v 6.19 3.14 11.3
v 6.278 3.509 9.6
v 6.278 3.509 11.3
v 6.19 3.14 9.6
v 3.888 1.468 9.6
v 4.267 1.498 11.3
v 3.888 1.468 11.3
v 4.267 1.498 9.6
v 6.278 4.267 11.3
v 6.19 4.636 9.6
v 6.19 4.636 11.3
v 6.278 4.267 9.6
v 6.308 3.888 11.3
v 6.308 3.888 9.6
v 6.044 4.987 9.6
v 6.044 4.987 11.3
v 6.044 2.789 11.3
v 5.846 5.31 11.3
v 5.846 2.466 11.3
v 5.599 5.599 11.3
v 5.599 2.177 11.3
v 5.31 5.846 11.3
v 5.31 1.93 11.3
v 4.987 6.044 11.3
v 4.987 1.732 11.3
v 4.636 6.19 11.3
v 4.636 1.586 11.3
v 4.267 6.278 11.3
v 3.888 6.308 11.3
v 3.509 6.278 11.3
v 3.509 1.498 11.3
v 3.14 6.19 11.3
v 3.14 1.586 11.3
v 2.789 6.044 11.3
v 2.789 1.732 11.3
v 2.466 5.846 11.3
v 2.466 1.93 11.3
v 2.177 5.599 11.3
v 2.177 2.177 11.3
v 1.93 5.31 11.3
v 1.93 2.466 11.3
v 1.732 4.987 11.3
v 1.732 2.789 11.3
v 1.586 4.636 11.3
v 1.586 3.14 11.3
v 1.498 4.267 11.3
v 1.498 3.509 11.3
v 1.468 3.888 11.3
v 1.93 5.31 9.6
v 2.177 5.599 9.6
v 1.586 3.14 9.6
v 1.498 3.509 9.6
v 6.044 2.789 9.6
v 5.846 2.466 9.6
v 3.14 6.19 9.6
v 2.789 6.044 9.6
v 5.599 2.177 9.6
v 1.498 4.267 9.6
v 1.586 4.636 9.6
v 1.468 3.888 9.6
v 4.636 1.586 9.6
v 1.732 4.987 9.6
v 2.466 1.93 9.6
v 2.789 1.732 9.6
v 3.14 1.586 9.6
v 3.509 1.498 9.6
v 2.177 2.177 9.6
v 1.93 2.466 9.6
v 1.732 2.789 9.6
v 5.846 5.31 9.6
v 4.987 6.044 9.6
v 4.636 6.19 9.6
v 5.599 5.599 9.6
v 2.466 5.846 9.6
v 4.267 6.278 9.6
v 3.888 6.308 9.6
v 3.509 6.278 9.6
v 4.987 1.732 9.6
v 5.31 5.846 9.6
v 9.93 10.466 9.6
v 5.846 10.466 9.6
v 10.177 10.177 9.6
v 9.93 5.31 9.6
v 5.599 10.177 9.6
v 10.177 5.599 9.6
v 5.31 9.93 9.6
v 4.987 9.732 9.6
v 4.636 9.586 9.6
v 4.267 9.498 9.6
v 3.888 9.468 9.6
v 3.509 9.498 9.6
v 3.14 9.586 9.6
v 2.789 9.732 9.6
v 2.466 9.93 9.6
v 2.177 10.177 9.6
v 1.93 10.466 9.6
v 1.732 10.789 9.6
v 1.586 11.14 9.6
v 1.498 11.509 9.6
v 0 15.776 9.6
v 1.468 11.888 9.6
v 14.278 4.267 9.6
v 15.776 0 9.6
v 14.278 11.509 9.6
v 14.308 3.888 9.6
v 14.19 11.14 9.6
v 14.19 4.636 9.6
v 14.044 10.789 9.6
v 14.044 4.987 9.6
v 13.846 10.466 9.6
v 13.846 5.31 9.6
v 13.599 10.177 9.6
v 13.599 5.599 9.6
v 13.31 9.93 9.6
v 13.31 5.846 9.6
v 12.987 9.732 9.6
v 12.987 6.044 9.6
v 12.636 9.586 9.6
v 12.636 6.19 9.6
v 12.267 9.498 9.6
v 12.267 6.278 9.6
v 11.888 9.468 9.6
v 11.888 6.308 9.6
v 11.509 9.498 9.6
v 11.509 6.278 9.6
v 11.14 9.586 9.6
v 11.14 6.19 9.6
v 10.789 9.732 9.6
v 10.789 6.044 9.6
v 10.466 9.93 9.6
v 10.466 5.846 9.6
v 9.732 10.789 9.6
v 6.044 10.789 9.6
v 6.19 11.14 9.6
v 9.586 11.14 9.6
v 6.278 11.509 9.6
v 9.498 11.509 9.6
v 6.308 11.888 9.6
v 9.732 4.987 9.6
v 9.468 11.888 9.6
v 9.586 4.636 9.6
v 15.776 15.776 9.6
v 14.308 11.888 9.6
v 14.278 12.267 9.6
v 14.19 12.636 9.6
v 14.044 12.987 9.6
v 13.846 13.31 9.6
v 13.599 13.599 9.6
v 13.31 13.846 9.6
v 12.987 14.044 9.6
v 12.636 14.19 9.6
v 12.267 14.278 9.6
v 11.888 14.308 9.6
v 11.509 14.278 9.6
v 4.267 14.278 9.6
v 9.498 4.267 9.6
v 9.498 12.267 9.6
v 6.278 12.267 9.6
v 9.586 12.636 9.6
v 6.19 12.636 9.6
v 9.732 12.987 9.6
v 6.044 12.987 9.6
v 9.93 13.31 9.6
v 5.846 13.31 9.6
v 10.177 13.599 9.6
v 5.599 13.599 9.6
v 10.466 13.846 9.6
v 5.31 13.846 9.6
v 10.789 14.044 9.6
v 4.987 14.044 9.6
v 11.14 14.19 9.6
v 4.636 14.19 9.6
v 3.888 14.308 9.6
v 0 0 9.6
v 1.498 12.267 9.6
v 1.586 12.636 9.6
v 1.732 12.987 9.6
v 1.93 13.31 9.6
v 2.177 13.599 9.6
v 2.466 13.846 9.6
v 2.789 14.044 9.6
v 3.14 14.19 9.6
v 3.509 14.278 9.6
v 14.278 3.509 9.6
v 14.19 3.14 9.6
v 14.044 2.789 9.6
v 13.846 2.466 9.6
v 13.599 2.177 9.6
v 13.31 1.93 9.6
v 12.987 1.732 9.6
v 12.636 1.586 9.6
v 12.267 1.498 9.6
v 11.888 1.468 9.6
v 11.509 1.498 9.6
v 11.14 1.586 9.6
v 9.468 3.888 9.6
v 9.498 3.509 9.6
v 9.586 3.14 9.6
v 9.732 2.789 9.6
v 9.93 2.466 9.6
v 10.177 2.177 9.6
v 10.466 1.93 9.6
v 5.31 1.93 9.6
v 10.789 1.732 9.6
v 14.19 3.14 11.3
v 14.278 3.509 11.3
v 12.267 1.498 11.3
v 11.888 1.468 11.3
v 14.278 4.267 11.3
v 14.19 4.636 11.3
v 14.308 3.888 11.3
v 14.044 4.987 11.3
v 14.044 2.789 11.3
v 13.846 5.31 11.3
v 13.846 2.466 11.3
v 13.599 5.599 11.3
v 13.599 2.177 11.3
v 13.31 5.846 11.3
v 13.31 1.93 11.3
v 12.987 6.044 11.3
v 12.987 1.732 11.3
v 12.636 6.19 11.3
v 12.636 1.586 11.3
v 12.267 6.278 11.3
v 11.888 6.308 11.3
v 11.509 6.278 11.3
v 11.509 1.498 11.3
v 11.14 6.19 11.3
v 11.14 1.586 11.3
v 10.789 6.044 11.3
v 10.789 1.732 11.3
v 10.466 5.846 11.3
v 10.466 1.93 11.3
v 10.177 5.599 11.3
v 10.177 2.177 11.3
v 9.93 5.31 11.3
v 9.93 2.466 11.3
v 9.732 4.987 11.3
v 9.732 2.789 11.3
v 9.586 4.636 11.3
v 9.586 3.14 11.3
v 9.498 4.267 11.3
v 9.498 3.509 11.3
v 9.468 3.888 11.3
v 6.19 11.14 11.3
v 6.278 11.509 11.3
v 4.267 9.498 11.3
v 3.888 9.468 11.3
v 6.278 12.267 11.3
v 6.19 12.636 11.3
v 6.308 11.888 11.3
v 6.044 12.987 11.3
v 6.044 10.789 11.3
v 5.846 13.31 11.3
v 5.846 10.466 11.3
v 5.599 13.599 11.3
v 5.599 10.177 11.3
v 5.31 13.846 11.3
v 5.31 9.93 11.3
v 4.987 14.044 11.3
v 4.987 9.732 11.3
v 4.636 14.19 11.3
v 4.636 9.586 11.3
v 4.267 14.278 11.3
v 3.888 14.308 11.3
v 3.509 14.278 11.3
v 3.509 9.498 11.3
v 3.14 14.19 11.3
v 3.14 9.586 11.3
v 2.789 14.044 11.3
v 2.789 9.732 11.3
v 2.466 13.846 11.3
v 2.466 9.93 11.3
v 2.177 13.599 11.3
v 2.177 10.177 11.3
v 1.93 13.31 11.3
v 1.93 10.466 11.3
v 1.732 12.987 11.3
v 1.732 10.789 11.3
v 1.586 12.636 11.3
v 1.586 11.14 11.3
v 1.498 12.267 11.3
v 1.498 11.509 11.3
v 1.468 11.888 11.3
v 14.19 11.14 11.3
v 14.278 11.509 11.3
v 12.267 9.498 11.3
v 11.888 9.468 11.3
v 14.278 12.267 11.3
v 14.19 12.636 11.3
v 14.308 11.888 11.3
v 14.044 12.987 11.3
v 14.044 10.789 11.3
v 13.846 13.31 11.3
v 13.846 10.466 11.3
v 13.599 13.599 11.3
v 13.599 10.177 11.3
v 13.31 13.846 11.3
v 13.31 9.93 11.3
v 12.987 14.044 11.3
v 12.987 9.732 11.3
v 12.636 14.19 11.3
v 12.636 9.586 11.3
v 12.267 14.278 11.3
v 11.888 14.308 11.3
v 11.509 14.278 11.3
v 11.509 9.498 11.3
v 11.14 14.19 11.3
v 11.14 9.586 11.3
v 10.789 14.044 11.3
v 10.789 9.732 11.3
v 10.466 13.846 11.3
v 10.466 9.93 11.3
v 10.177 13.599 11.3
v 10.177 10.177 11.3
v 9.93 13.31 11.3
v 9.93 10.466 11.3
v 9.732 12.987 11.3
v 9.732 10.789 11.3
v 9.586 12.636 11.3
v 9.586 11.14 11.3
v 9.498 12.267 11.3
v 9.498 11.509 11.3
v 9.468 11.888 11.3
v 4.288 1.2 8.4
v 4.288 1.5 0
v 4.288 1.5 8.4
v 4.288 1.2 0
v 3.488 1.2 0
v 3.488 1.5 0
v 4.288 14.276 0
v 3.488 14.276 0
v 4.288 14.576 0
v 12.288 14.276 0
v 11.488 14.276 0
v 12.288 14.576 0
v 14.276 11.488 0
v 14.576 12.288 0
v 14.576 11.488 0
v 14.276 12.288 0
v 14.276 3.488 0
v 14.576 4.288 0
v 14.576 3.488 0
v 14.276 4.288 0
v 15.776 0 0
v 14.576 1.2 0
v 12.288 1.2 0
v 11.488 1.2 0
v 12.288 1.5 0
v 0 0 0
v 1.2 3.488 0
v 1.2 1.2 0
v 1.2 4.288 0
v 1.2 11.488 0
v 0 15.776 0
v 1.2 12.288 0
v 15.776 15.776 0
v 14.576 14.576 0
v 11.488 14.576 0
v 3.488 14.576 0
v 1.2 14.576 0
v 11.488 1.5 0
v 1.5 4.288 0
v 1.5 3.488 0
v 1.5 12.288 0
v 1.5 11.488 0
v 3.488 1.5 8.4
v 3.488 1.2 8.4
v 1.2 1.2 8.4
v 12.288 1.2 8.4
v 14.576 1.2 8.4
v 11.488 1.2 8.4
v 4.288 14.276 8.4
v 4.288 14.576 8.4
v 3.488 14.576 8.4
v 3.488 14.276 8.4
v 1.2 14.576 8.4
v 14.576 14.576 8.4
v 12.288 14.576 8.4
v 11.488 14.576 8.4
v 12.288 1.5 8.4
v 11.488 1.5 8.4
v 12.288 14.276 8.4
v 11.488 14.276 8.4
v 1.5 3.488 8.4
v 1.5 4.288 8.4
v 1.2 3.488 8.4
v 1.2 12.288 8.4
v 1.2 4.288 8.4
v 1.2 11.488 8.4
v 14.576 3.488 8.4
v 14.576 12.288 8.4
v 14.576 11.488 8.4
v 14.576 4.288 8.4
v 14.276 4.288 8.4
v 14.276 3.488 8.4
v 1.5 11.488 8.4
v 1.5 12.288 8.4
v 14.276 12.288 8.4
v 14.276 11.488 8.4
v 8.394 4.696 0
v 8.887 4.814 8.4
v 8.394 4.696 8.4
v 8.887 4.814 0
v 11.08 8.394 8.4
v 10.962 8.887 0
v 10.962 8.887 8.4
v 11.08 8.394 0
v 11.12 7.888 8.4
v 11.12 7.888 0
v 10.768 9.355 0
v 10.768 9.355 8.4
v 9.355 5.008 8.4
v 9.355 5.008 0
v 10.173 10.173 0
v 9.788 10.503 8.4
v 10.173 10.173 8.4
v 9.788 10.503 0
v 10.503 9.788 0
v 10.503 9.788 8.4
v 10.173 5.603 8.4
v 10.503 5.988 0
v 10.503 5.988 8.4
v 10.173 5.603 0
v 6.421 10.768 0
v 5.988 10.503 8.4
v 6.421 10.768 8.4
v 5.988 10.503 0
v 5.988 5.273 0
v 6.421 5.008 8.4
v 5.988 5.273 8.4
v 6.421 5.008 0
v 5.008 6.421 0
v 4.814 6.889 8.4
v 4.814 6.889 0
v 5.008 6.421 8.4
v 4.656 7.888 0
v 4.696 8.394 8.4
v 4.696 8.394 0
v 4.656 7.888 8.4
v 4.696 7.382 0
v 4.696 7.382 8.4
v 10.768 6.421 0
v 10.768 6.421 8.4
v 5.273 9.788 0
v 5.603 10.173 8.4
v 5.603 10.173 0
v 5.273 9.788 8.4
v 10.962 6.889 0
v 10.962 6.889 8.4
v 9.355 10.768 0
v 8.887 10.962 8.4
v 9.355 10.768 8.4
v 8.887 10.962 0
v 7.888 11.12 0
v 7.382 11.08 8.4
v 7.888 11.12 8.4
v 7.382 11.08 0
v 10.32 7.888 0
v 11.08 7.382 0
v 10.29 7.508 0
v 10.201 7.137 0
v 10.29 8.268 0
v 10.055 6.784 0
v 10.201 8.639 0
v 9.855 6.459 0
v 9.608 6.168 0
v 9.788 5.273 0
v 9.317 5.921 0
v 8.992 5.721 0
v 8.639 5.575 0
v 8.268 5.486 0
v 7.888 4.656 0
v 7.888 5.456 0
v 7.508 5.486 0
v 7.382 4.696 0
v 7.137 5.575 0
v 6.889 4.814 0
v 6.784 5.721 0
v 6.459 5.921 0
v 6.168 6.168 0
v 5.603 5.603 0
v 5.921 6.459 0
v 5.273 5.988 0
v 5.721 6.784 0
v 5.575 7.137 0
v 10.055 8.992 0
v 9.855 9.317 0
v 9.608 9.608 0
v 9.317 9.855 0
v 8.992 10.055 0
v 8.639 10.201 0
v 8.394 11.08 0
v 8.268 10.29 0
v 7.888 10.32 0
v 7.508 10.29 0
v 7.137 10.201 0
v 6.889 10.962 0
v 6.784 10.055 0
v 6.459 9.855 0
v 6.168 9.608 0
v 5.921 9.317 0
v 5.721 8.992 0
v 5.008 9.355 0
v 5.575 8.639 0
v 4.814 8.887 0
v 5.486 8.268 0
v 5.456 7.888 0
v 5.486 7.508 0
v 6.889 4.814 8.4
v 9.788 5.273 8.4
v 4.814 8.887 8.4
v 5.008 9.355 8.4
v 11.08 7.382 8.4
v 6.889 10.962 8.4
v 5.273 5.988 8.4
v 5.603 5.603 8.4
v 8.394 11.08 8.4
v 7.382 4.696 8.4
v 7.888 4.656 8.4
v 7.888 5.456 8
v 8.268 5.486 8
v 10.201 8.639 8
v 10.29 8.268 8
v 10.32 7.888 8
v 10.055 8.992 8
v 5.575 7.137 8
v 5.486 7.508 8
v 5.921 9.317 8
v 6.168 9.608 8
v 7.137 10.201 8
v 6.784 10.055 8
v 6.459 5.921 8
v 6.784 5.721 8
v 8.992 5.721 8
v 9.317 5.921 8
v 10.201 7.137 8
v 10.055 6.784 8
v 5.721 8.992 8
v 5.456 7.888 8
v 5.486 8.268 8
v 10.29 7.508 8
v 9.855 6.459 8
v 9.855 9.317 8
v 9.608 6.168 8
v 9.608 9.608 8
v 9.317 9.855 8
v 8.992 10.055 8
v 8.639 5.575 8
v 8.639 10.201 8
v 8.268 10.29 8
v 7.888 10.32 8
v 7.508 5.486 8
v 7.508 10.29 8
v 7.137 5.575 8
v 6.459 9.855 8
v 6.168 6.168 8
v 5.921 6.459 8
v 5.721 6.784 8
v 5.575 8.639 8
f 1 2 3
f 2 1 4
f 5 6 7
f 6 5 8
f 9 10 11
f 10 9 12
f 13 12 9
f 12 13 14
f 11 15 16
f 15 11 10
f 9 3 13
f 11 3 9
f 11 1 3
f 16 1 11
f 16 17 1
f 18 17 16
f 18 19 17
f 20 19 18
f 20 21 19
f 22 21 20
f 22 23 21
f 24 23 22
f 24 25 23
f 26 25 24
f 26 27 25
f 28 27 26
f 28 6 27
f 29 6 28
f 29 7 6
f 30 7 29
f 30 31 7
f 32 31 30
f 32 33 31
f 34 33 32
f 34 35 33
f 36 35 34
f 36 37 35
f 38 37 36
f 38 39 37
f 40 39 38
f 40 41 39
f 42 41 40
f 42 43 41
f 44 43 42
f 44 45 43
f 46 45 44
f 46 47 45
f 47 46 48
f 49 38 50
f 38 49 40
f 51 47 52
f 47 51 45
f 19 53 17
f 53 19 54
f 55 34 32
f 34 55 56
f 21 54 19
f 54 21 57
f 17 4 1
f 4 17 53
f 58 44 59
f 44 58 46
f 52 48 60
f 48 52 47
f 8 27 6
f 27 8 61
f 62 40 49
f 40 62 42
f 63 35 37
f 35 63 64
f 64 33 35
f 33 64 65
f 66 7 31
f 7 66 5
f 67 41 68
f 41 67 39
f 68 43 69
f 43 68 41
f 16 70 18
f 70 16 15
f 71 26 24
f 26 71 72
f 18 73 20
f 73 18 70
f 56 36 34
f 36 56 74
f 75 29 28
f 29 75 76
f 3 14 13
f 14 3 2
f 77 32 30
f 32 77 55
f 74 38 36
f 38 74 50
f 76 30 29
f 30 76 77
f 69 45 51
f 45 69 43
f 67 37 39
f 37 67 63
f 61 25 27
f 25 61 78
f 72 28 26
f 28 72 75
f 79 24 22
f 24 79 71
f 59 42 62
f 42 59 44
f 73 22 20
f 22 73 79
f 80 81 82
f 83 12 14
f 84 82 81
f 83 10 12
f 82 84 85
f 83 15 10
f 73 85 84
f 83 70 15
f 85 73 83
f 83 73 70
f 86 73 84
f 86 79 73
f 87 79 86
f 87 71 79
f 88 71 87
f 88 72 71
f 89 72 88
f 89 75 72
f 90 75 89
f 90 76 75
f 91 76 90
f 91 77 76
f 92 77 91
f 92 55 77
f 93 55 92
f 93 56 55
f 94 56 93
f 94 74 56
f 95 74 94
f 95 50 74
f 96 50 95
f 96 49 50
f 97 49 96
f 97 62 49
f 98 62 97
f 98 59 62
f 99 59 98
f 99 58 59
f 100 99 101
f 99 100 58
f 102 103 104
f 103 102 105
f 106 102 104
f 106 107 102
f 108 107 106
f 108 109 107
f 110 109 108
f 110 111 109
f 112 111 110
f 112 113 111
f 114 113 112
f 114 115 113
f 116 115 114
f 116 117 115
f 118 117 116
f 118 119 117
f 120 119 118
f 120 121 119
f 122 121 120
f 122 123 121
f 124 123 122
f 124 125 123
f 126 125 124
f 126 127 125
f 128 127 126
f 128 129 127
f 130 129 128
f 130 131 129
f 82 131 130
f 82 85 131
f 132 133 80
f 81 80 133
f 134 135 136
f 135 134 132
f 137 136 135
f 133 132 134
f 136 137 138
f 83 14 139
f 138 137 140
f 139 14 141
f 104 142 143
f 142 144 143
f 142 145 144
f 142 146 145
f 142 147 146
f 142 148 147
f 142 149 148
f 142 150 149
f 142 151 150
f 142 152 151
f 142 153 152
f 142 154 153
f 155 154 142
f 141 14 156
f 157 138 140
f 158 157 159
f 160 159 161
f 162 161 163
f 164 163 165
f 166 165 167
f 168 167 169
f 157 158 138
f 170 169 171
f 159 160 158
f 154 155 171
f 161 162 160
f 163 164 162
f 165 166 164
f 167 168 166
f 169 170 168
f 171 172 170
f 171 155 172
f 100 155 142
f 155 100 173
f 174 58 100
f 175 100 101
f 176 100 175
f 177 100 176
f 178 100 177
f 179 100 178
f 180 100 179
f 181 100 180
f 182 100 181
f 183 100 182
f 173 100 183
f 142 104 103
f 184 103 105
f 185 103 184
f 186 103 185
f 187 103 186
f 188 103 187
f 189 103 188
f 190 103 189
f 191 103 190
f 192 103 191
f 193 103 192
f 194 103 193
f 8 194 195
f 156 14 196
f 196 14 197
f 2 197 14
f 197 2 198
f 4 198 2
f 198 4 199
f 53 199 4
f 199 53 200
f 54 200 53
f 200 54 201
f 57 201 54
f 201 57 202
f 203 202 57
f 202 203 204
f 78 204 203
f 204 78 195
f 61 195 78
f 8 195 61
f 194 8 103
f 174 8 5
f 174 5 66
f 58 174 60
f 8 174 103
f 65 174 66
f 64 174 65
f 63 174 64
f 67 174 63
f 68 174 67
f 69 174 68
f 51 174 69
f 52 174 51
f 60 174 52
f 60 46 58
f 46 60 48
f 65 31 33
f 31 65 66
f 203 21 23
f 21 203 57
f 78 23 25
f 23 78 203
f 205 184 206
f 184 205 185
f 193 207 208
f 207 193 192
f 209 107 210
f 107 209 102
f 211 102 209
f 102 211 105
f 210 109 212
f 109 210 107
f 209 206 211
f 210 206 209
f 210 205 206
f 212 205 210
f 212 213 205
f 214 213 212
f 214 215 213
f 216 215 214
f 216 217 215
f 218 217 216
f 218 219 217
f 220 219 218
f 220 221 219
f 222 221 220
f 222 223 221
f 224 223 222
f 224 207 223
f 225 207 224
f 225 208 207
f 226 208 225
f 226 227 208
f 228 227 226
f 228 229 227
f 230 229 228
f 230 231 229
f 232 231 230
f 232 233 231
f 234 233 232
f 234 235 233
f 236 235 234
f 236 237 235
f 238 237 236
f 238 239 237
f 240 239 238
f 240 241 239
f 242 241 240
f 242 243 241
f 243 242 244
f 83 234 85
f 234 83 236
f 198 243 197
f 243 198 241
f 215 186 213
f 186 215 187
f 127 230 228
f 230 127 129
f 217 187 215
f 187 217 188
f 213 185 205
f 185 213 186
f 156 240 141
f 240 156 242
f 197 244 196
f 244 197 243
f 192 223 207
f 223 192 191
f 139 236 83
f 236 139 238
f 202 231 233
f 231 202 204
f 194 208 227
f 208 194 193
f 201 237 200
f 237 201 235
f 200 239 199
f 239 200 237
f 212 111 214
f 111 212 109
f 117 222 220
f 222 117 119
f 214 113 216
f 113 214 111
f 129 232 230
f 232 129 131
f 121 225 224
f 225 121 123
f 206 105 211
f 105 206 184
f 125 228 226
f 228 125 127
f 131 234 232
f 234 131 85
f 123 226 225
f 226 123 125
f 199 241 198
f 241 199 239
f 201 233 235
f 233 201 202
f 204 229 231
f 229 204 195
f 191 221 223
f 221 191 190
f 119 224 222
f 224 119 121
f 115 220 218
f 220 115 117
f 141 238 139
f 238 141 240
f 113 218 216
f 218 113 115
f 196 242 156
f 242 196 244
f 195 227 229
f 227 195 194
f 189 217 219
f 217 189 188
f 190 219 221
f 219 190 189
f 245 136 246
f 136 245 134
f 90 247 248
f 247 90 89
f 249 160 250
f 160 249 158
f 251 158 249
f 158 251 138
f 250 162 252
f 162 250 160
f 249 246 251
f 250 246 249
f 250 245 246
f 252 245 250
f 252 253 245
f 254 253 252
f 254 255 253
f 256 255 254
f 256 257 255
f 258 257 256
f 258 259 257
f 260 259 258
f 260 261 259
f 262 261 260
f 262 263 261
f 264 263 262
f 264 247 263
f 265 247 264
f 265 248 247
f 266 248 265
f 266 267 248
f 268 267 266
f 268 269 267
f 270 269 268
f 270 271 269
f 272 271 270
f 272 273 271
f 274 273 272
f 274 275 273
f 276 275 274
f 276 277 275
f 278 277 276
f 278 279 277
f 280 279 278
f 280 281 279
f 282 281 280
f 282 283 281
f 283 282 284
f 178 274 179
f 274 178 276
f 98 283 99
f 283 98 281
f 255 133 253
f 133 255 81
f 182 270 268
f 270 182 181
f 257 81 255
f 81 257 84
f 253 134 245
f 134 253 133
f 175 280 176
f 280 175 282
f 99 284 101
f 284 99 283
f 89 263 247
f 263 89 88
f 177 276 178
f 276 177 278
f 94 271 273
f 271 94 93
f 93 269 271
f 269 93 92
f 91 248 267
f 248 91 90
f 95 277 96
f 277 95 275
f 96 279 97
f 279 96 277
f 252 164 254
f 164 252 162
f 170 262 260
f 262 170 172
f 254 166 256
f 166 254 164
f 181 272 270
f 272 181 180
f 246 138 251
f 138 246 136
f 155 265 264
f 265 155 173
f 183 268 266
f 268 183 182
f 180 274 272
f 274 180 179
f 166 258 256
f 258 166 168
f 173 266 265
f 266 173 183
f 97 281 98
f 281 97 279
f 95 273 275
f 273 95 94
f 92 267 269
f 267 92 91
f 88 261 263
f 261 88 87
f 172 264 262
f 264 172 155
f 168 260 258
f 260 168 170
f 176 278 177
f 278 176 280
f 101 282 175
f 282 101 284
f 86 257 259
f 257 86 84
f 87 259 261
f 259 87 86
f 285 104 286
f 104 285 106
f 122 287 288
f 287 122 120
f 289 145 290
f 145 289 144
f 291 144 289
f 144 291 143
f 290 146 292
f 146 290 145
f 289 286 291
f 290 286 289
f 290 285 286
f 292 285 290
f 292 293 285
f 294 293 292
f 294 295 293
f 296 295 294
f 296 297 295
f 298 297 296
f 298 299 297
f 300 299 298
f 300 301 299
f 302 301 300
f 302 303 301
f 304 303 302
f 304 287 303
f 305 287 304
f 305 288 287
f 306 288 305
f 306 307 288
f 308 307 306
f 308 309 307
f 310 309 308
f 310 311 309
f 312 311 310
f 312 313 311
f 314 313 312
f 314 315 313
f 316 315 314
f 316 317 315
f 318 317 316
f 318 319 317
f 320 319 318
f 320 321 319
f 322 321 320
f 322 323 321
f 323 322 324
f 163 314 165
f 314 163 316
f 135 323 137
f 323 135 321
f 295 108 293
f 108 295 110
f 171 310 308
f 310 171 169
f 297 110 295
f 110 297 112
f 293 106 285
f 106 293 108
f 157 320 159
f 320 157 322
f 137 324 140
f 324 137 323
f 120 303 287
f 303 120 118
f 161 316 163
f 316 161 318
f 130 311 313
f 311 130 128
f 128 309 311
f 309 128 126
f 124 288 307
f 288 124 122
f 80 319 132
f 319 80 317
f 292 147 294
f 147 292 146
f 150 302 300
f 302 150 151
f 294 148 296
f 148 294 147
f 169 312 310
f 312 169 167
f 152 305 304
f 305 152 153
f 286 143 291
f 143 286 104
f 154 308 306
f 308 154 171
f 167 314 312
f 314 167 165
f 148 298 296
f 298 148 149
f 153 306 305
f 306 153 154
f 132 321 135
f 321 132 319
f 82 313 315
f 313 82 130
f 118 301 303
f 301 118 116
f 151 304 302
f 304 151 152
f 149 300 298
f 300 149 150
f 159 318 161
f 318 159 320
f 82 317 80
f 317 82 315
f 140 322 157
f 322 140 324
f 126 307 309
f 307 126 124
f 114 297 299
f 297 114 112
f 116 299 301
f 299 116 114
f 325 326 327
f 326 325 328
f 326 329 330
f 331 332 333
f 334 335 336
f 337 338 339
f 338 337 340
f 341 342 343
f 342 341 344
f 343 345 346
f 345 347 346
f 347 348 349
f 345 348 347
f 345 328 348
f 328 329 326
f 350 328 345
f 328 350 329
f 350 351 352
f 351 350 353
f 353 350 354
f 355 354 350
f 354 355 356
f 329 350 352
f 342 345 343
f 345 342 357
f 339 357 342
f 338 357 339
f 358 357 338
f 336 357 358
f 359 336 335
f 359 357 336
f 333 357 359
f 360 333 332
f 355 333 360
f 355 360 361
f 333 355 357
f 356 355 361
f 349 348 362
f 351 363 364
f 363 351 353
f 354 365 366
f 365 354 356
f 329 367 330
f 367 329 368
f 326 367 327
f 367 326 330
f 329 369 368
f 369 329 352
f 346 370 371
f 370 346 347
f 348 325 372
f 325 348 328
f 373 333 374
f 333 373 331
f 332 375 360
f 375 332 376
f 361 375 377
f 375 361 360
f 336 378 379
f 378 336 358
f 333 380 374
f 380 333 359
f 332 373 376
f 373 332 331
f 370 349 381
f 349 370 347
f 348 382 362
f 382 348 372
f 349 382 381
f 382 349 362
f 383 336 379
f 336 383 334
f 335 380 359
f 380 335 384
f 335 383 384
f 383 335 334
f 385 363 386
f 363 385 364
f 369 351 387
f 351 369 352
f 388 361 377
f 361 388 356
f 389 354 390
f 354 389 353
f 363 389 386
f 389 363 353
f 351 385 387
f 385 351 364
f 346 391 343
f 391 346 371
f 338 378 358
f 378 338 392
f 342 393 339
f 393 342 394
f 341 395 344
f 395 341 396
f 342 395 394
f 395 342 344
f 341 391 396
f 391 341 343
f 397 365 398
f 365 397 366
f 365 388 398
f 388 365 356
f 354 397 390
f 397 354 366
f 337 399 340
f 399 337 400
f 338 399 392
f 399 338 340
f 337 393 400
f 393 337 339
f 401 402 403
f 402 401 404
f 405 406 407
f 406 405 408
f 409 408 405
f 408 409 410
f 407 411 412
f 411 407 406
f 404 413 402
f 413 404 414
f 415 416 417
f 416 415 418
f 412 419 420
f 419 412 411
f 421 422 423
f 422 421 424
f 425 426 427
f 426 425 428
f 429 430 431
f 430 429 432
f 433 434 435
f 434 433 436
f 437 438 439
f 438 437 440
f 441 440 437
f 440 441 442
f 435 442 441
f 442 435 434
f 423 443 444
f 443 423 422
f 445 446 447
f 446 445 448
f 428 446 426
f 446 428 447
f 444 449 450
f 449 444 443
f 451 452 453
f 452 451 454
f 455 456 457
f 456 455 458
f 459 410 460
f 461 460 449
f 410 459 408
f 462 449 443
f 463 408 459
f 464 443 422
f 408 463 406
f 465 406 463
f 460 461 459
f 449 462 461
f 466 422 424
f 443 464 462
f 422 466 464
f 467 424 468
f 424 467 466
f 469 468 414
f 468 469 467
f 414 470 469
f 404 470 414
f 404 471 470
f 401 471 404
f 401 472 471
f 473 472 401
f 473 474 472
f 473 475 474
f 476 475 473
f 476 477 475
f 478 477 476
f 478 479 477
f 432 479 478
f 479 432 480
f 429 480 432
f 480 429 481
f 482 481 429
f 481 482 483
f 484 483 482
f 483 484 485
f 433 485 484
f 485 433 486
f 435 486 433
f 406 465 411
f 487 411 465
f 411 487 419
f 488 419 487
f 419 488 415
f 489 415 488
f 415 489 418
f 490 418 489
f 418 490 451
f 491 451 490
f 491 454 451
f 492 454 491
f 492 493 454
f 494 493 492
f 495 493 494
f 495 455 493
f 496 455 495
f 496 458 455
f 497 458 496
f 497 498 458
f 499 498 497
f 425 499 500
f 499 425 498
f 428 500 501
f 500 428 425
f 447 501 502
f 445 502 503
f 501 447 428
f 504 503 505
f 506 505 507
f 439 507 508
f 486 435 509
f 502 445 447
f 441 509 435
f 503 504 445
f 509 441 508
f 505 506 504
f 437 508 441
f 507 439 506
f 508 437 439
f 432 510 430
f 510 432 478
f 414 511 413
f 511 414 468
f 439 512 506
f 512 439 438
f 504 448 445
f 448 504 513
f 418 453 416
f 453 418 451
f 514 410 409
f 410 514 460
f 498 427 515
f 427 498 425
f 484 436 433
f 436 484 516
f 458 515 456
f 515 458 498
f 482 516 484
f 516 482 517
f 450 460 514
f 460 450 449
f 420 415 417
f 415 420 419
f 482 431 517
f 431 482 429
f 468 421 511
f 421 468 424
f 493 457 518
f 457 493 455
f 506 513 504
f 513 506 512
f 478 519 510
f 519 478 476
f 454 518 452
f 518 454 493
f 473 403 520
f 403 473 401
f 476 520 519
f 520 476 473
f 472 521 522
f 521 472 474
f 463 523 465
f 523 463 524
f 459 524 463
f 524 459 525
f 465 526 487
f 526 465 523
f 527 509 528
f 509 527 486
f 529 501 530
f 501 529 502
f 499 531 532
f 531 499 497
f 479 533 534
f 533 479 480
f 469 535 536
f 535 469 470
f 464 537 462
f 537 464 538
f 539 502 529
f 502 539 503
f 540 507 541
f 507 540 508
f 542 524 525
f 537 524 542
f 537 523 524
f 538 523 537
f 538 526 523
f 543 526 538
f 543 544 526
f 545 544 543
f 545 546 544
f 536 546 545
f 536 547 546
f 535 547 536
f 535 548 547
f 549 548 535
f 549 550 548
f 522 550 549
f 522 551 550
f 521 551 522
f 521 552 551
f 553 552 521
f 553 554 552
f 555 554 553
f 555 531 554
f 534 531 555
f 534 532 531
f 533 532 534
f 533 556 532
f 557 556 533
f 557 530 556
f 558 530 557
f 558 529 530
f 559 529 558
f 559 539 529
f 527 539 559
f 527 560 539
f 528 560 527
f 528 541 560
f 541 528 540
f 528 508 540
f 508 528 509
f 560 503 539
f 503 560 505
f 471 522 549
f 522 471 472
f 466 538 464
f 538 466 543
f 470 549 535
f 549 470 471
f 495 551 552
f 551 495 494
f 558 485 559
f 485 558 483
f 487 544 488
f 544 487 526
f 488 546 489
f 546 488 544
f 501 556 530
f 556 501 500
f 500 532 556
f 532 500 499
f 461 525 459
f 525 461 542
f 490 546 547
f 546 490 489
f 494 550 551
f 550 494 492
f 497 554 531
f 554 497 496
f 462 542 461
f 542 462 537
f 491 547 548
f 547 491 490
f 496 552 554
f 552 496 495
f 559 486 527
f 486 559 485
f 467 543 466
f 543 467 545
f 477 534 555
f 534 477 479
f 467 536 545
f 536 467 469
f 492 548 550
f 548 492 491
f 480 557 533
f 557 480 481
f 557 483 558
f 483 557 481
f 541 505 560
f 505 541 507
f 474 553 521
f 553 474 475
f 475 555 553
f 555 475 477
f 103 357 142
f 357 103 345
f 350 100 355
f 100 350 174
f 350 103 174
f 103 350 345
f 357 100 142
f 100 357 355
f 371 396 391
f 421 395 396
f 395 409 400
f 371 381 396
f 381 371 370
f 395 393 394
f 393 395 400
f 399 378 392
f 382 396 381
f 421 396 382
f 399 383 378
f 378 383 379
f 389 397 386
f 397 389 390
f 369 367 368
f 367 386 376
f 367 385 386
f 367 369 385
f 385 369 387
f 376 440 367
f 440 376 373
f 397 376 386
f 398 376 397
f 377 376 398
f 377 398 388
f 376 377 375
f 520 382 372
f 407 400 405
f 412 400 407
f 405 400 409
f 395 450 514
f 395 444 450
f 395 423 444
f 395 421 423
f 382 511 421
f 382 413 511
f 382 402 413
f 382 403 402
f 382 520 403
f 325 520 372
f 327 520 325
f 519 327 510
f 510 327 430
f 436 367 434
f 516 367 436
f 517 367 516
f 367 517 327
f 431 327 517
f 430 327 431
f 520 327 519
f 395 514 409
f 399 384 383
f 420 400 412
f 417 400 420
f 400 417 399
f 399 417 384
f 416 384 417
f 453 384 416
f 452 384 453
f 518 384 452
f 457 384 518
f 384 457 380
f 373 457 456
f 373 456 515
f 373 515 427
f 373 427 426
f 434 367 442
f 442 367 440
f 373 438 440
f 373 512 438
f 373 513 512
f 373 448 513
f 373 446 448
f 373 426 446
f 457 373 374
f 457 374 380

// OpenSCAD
//Number of studs long
length = 2;

//Number of studs wide
width = 2;

//Nozzle Size
// Used to avoid generating support lines too skinny to print well. If you want exact lines, lie and set this to something small like .1mm.
nozzle_size = .4;

// This adjustment will be removed from the thickness of the wall on *both sides* and does impact the overall size of the resulting brick.
wall_adjustment = .2;

//Additional spacing factor between individual pieces. This adjustment will reduce the length of walls on *both sides*.
gap_factor = -0.088; 

//Amount to remove from brick height. Divided by three for plates/bases. Typically full-height bricks are already okay, but plates may need a height reduction.
height_adjustment = 0;

//Amount to remove from the height of studs
stud_height_adjustment = .1;

//Amount to remove from the radius of studs
stud_radius_adjustment = -.02;

//Amount to remove from the radius of the supports posts. Only used on 2xN pieces. Default is one quarter of the standard play factor
support_post_radius_adjustment = .025;

//Full-height brick vs plate vs base. A base is a plate with a completely flat bottom. Base is NOT SUPPORTED yet. You will end up with a plate.
block_type = "brick"; // [brick:Brick, plate:Plate, base:Base]

//Normal has studs, tiles do not
surface_type = "normal"; // [normal:Normal, tile:Tile]


/* No need to modify anything else */

/* [Hidden] */

lego_unit = 1.6;
LU = lego_unit; //short-hand

unit_span = 5*LU;
SU = unit_span; //short-hand (stands for: Stud Unit)

//TODO: way to make the top wall skinner for larger nozzle sizes
//TODO: ridge adjustments (needed because of wall and nozzle adjustments)

/* STUD HEIGHT:
 There is debate over this.
 Some people say 1.8, some say 1.7, and some say one lego unit (1.6).
 I believe actual lego studs are 1.8, *but this includes the "lego" emboss.*
 Thus, a more practical default printing height is 1.7.
 So, since we also have a height adjustment defaulted to .1,
  I will use 1.8 for the height starting point.
*/
base_stud_height = 1.8;

stud_height = base_stud_height - stud_height_adjustment;

wall_thickness = lego_unit - (2 * wall_adjustment);

//Supports across the underside of the brick.
// Do not appear on plates.
// They bridge up to a 3.2mm gap about 1.6mm above the build surface, so set this to "No" if the gap will cause a problem for your printer
include_cross_supports = "Y"; // [Y:Yes, N:No]
/* Note for above: moved to hidden section, because if you can't bridge that you're gonna have problems anyway when it's time to print the top wall */


//brick is default. If we don't understand this, default to brick height
brick_height = ((block_type == "plate" || block_type == "base")? (2*LU) : 6*LU);

final_height_adjustment = height_adjustment / ((block_type == "plate" || block_type == "base")? 3 : 1);

w = (width > length)?length:width;
l = (width > length)?width:length; //TODO: l vs 1 can be hard to see
h = brick_height - final_height_adjustment;

G = gap_factor; //short-hand
WT = wall_thickness; //short-hand
PF = wall_adjustment; //short-hand; stands for Play Factor (Lego's term, I believe)

//OUTER WALLS

//gap factor and play factor remove from outer wall on BOTH SIDES of the part,
// so double them when accounting for wall lengths
long_wall_l = (l*SU)-(2*G)-(2*PF);
short_wall_l = (w*SU)-(2*G)-(2*PF);

//long walls

cube([long_wall_l,WT,h],0);

translate([0,short_wall_l-WT,0])
{
    cube([long_wall_l, WT,h],0);
};

//short walls

cube([WT, short_wall_l,h],0);

translate([(l*SU) - (2*G)-LU,0,0])
{
    cube([WT,short_wall_l,h],0);
}

//top
translate([0,0,h-WT])
{
    cube([long_wall_l, short_wall_l, WT],0);  
};

//STUDS

stud_rad = (1.5*LU) - stud_radius_adjustment;

first_stud = (SU/2) - PF - G;

//default as "normal". If we don't understand the value, default to true
if (surface_type != "tile") 
{
    for(y=[0:w-1])
    {
        for(x=[0:l-1])
        {
            translate([first_stud+(x*SU),first_stud+(y*SU),h])
            {
                cylinder(stud_height,stud_rad, stud_rad, $fn=40);
            };
        }
    }
}

//INTERIOR RIDGES

// ridge depth should make up the space lost for interior wall adjusment + add .1mm (Lego play factor) to help it grip
//TODO: now that I have a good default, make an adjustment for this
ridge_d = PF + .1;
//  These ridges can challenge printers; make sure minimum length is 2*nozzle
ridge_w = LU/2<(2*nozzle_size)?(2*nozzle_size):LU/2;

// plates and bases do not have ridges
if (block_type == "brick" && w > 1)
{
    //long edge
    for(x=[0:l-1])
    {  
        translate([first_stud+(x*SU)-(ridge_w/2), WT, 0])
        {
            cube([ridge_w, ridge_d, h],0);
        }
        translate([first_stud+(x*SU)-(ridge_w/2), short_wall_l-WT-ridge_d, 0]) 
        {
            cube([ridge_w, ridge_d, h],0);
        }
    }

    //short edge
    for(y=[0:w-1])
    {  
        //near side
        translate([WT,first_stud+(y*SU)-(ridge_w/2), 0])
        {
            cube([ridge_d, ridge_w, h],0);
        }
        //far side
        translate([long_wall_l-WT-ridge_d, first_stud+(y*SU)-(ridge_w/2),0]) 
        {
            cube([ridge_d, ridge_w, h],0);
        }
    }
}


//UNDER-SIDE CENTER SUPPORT POSTS

if (w==1 )
{
    //Nx1 posts (narrow solid, cross support on every post)
    
    /*Note on adjument factor for the post radius.
    
       Since these posts are 1LU, and studs are 3LU, 
       it's tempting to just use 1/3 that.
       However, I believe it's about area, rather than radius here.
       Thus, 1/9 is more appropriate (square of the sides).
       (LU-(stud_radius_adjustment/9)) 
      
       Of course, I could also be way off :)
       For now, I'm not doing either. Tests so far
       using un-adjusted posts, and 1xN bricks fit
       better than almost anything else I print. 
       I may put an adjustment back in the future if people ask for it.   
    */
    
    support_w = LU/4<nozzle_size?nozzle_size:LU/4;
    
    for(x=[1:l-1])
    {  
        translate([(SU*x)-PF-G,first_stud,0])
        {
            cylinder(h, LU, LU, $fn=30);
        }
        
        //cross supports
        if (include_cross_supports == "Y")
        {
            translate([x*SU-PF-G-(support_w/2),0,LU+PF])
            { 
                cube([support_w,short_wall_l, h-LU-PF],0);
            }        
        }
    }
}
else   
{
    // Nx2+ posts (wide hollow, cross support every other post)
    
    // Not sure how to handle cross support yet for non-standard (odd-length)
    // bricks with an even number of posts. 
    // Supports are there, but not aligned well.
    
    
    sup_w = LU/2<(2*nozzle_size)?(2*nozzle_size):LU/2;
    
    outer = ((((pow(2,.5)*5)-3)/2) * LU)-support_post_radius_adjustment;
    inner = outer - sup_w;
    
    for(x=[1:l-1])
    {
        for(y=[1:w-1])
        {  
            difference()
            {
                translate([SU*x-PF-G,SU*y-PF-G, 0])
                {
                    cylinder(h, outer, outer, $fn=40);
                }
                translate([SU*x-PF-G,SU*y-PF-G, -.1])
                {
                    cylinder((h-LU)+.1, inner, inner, $fn=40);
                }
            }
            
            //partial cross supports
            if (include_cross_supports == "Y" && x%2==0)
            {          
                translate([(SU*x)-PF-G-(sup_w/2),((y*SU)+inner)-G-PF,LU+PF])
                { 
                    cube([sup_w,SU-(2*inner),h-LU-PF],0);
                }               
            }            
        }
        
        //remaining cross supports
        if (include_cross_supports == "Y")        
        { 
            sup_l = SU-inner-WT-G-PF;
           
            if (x%2 ==0)
            {
                translate([x*SU-PF-G-(sup_w/2),WT,LU+PF])
                { 
                    cube([sup_w,sup_l,h-LU-PF],0);
                }
                translate([x*SU-PF-G-(sup_w/2),short_wall_l-WT-sup_l,LU+PF])
                { 
                    cube([sup_w,sup_l,h-LU-PF],0);
                }
            }
        }
    }
}
